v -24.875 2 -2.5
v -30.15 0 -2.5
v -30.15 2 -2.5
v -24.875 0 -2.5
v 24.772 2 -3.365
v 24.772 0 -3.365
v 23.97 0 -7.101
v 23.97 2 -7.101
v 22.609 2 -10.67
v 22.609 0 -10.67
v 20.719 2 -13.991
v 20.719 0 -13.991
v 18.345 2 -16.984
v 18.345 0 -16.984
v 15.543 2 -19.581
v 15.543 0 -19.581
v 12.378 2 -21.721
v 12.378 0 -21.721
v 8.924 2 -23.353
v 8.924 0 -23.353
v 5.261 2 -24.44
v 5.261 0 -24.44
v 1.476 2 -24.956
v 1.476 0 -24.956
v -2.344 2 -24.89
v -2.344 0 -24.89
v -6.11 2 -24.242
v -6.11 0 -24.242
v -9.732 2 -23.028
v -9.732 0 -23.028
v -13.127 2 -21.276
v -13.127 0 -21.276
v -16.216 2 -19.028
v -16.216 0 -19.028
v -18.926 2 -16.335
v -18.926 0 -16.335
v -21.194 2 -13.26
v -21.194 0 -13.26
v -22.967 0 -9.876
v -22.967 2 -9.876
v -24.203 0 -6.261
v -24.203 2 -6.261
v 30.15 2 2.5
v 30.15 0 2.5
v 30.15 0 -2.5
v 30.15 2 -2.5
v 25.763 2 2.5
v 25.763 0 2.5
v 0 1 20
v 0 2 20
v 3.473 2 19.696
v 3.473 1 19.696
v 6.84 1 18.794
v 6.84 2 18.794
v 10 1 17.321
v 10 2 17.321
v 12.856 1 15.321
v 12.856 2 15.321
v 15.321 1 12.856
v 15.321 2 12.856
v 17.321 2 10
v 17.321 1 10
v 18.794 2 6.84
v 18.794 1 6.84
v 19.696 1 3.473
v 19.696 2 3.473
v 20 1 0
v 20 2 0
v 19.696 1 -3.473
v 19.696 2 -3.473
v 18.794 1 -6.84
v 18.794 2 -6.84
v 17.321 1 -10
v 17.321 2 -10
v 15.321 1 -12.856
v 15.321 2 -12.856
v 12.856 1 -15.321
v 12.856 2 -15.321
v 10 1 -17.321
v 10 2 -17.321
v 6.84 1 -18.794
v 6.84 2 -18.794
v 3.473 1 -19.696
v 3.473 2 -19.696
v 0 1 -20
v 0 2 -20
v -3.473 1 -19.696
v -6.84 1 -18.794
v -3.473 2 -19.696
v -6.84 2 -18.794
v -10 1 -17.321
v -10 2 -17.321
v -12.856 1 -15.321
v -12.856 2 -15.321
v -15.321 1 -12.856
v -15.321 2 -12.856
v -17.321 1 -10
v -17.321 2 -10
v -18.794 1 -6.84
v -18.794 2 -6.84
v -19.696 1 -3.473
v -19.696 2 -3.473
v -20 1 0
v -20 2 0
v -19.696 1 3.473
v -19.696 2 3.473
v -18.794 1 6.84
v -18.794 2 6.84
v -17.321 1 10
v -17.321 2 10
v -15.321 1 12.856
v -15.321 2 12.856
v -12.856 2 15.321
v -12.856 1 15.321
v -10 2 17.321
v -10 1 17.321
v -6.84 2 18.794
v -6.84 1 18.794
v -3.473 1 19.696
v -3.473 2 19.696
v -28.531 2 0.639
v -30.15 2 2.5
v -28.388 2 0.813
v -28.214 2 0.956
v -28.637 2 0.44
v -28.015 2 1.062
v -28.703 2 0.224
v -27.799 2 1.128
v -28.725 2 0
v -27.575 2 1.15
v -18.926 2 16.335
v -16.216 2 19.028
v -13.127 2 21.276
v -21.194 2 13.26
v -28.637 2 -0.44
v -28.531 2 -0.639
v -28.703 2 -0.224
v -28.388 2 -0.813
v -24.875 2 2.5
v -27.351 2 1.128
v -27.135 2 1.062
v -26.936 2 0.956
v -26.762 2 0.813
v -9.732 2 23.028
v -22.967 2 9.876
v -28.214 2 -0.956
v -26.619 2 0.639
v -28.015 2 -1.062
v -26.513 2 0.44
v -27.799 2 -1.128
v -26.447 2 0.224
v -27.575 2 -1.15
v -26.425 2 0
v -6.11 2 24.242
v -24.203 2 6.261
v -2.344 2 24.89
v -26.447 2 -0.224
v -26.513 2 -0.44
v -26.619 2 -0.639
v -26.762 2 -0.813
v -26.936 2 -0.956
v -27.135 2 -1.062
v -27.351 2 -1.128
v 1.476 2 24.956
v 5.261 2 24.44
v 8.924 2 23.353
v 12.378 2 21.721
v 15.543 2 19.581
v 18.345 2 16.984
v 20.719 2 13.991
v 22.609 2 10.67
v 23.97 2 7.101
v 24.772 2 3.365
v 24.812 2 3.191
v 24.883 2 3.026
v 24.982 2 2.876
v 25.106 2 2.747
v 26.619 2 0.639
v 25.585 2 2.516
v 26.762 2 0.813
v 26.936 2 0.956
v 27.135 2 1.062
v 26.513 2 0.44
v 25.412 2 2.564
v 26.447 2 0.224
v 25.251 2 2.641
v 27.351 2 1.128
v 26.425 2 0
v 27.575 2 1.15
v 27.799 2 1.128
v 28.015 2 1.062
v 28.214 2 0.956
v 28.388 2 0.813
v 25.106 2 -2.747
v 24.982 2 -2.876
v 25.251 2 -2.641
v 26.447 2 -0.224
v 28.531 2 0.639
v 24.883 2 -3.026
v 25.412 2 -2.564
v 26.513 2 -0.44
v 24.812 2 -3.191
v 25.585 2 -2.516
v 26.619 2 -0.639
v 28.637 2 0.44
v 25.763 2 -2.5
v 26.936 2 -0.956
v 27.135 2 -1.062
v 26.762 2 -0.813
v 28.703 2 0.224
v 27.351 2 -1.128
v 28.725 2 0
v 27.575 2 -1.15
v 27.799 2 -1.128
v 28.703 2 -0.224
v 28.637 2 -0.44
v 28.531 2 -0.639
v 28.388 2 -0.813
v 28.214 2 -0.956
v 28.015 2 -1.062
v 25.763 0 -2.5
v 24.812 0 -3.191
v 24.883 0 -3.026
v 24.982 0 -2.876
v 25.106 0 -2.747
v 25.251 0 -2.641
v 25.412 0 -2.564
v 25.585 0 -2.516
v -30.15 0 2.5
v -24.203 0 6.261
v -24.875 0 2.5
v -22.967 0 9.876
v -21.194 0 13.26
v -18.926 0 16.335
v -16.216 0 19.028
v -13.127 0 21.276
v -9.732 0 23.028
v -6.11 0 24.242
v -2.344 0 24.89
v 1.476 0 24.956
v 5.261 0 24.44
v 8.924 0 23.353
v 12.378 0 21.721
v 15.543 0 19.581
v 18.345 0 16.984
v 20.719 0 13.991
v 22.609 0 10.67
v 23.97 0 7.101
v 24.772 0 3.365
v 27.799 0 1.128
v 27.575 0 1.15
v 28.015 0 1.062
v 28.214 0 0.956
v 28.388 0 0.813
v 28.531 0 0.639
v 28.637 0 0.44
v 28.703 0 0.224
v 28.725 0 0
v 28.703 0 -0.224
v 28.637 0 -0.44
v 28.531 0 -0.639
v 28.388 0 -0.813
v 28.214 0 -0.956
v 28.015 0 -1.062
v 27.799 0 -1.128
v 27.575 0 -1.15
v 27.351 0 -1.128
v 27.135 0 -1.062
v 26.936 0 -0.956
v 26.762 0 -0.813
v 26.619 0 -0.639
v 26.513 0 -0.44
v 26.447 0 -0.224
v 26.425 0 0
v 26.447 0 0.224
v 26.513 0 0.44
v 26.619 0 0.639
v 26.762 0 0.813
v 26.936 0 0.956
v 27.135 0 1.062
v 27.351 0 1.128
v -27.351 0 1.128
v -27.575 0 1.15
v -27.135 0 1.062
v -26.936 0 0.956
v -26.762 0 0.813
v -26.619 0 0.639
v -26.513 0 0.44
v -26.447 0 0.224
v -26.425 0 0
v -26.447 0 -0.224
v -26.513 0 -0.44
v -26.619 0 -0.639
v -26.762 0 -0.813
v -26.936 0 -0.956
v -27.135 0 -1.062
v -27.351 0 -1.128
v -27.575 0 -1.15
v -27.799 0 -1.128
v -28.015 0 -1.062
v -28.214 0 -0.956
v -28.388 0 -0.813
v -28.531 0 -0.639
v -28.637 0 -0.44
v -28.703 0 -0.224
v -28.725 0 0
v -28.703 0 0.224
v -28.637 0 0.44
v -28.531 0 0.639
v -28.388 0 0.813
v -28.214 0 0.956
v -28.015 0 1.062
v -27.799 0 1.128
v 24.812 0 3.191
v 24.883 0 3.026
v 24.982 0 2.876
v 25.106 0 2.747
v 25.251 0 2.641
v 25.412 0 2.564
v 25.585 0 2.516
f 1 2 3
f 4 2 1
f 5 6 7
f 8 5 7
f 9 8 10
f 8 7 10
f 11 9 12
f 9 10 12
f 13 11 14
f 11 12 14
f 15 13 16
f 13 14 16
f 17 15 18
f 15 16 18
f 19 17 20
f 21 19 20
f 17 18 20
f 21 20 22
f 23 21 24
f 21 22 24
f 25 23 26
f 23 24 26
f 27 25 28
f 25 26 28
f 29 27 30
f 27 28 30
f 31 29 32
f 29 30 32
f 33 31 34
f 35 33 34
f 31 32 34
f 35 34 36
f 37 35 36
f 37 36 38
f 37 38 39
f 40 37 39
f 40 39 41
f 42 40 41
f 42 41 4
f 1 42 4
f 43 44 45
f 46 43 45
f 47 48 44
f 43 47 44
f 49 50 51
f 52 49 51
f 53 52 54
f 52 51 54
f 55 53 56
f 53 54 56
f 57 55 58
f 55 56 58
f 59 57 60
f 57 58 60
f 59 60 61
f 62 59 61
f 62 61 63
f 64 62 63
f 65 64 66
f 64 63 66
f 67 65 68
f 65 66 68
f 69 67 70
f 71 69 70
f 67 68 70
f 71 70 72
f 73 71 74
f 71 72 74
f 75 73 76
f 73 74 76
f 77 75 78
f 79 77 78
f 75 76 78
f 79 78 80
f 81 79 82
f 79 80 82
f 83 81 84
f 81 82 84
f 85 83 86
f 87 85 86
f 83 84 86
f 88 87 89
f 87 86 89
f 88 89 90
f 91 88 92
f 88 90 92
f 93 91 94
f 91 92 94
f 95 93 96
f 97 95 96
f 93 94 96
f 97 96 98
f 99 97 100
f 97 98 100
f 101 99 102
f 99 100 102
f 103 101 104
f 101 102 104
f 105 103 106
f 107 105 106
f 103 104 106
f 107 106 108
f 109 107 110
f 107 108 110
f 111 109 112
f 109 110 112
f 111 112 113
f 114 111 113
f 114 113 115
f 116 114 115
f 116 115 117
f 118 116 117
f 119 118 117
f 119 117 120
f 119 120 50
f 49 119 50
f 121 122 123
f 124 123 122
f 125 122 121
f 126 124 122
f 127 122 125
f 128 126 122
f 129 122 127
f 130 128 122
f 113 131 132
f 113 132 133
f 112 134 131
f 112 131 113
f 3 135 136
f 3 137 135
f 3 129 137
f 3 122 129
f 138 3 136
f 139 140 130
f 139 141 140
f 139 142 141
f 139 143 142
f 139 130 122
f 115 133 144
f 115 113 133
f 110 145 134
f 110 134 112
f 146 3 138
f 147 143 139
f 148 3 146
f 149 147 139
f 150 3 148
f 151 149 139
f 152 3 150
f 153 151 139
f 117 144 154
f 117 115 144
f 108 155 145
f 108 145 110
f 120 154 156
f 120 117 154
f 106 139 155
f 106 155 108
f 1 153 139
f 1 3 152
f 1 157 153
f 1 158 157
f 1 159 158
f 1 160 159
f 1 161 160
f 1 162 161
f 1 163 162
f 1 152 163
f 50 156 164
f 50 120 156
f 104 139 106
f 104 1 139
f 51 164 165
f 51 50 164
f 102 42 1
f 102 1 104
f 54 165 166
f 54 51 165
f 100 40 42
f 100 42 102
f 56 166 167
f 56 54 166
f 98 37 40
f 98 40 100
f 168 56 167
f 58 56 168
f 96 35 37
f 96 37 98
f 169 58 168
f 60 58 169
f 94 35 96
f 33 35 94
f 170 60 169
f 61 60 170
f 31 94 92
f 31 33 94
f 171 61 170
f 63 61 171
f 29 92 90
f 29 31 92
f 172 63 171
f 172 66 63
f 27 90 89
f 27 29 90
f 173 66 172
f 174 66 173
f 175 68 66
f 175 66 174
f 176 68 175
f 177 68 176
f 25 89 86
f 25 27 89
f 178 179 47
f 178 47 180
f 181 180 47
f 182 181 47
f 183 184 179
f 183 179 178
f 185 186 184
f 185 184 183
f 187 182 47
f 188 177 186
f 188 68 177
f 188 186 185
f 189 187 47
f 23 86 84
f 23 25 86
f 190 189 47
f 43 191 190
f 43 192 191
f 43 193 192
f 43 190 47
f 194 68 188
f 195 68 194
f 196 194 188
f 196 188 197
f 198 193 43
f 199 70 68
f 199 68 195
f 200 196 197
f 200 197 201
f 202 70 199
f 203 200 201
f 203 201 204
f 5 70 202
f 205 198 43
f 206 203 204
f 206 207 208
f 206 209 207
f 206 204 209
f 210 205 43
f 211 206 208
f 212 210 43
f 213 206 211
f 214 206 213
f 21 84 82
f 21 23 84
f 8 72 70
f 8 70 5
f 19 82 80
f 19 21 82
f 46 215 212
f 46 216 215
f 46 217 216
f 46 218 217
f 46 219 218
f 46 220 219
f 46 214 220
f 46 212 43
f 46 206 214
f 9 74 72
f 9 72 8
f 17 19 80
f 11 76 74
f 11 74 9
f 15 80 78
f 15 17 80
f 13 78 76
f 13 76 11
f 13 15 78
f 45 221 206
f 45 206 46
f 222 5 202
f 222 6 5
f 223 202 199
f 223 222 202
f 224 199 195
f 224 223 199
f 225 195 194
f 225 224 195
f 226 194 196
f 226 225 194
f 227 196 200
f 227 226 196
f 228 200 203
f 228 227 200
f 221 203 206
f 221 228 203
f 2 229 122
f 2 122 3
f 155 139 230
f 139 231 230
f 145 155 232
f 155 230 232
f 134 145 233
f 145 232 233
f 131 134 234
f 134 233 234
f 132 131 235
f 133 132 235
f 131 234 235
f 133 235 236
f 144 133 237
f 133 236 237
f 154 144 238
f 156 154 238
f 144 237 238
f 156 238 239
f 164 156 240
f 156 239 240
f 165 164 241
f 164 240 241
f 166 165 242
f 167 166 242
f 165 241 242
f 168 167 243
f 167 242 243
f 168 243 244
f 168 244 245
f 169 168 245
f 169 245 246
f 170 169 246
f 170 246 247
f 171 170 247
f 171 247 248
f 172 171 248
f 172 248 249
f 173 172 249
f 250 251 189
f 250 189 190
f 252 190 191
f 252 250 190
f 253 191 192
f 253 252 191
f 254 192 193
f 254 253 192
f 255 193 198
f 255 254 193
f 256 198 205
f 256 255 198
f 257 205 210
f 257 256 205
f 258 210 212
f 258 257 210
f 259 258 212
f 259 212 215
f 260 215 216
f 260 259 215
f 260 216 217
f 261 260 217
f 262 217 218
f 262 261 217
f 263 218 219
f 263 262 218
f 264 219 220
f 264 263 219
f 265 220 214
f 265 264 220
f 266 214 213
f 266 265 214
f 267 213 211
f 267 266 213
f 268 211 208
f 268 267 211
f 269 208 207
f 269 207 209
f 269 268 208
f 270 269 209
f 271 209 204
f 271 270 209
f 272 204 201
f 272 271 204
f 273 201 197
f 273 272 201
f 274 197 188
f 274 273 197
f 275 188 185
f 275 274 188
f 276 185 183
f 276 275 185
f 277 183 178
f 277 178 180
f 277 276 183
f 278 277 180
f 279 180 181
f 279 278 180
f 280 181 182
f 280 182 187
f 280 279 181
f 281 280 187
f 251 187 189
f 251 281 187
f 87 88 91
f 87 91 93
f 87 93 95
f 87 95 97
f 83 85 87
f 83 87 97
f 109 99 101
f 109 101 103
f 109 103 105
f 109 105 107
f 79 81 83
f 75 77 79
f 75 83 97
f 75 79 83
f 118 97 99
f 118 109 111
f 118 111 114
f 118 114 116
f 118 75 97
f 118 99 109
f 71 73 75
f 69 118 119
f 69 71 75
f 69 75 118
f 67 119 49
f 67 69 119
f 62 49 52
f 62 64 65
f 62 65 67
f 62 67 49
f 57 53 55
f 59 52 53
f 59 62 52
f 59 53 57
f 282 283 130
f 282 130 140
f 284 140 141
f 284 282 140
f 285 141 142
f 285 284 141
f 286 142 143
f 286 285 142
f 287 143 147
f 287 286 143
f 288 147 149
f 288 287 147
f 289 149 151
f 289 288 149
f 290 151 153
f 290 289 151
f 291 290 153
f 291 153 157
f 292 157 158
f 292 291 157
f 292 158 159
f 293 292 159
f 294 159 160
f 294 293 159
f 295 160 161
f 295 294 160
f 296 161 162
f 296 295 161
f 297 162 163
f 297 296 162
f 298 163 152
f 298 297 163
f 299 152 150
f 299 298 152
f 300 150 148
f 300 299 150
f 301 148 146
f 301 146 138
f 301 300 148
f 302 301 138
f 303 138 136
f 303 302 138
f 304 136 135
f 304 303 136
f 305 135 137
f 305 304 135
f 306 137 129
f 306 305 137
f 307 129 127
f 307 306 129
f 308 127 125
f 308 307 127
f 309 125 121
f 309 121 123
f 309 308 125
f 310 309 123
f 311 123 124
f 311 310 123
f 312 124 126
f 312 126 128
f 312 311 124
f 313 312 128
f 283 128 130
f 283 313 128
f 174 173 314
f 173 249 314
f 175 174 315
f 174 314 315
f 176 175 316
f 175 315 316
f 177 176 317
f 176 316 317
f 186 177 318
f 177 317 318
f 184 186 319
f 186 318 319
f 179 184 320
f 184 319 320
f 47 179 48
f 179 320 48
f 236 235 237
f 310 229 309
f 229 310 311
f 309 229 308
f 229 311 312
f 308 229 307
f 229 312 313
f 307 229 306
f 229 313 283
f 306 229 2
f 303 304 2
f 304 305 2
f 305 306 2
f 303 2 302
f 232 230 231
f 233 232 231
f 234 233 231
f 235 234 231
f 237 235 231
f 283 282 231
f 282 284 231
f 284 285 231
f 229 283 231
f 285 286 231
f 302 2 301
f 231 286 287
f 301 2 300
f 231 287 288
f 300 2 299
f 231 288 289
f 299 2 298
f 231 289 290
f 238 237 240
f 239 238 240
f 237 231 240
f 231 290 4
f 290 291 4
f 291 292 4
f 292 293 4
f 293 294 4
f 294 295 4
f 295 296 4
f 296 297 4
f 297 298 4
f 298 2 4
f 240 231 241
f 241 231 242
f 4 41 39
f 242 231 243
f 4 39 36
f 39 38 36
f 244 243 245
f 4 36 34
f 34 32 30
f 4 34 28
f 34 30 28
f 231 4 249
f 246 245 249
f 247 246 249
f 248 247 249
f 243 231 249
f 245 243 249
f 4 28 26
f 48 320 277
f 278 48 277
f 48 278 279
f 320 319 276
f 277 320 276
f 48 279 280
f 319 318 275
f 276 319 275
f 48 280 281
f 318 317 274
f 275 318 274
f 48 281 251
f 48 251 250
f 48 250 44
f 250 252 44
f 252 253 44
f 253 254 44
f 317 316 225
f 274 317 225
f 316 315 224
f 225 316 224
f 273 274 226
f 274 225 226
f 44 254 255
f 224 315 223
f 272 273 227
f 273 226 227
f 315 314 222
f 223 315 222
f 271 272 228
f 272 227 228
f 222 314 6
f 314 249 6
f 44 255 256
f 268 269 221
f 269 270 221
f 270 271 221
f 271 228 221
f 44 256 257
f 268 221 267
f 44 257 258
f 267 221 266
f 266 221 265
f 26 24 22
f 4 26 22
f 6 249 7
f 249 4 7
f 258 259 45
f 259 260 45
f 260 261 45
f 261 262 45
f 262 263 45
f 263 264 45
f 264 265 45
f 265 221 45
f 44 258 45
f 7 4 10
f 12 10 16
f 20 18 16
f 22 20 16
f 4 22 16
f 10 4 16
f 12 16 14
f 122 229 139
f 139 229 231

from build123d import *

# Parameters (mm, degrees)
CROQUIS1_R              = 25
CROQUIS1_W              = 10.3
CROQUIS1_H              = 5
CROQUIS1_R_2            = 1.15
SALIENTE_EXTRUIR1_DEPTH = 2
REDONDEO1_R             = 1
CROQUIS2_R              = 20
CORTAR_EXTRUIR1_DEPTH   = 1


with BuildPart() as part:
    # Croquis1 → Saliente-Extruir1 (new body)
    # profile 1 of 3: a face of its own
    with BuildSketch(Plane(origin=(0, 0, 0), x_dir=(1, 0, 0), z_dir=(0, 1, 0))):
        Circle(CROQUIS1_R)
    # profile 2 of 3: a face of its own
    with BuildSketch(Plane(origin=(0, 0, 0), x_dir=(1, 0, 0), z_dir=(0, 1, 0))):
        with Locations((25, 0)):
            Rectangle(CROQUIS1_W, CROQUIS1_H)
        with Locations(Location((27.575, 0, 0), (0, 0, 270))):
            Circle(CROQUIS1_R_2, mode=Mode.SUBTRACT)
    # profile 3 of 3: a face of its own
    with BuildSketch(Plane(origin=(0, 0, 0), x_dir=(1, 0, 0), z_dir=(0, 1, 0))):
        with Locations((-25, 0)):
            Rectangle(CROQUIS1_W, CROQUIS1_H)
        with Locations(Location((-27.575, 0, 0), (0, 0, 270))):
            Circle(CROQUIS1_R_2, mode=Mode.SUBTRACT)
    extrude(amount=SALIENTE_EXTRUIR1_DEPTH)

    # Redondeo1
    redondeo1_edges = [part.edges().sort_by_distance(p)[0] for p in [
        (24.874685928, 1, -2.5),
        (24.874685928, 1, 2.5),
    ]]
    fillet(redondeo1_edges, radius=REDONDEO1_R)

    # Croquis2 → Cortar-Extruir1 (cut)
    with BuildSketch(Plane(origin=(0, 2, 0), x_dir=(1, 0, 0), z_dir=(0, 1, 0))):
        with Locations(Location((0, 0, 0), (0, 0, 270))):
            Circle(CROQUIS2_R)
    extrude(amount=-CORTAR_EXTRUIR1_DEPTH, mode=Mode.SUBTRACT)


solid = part.part
